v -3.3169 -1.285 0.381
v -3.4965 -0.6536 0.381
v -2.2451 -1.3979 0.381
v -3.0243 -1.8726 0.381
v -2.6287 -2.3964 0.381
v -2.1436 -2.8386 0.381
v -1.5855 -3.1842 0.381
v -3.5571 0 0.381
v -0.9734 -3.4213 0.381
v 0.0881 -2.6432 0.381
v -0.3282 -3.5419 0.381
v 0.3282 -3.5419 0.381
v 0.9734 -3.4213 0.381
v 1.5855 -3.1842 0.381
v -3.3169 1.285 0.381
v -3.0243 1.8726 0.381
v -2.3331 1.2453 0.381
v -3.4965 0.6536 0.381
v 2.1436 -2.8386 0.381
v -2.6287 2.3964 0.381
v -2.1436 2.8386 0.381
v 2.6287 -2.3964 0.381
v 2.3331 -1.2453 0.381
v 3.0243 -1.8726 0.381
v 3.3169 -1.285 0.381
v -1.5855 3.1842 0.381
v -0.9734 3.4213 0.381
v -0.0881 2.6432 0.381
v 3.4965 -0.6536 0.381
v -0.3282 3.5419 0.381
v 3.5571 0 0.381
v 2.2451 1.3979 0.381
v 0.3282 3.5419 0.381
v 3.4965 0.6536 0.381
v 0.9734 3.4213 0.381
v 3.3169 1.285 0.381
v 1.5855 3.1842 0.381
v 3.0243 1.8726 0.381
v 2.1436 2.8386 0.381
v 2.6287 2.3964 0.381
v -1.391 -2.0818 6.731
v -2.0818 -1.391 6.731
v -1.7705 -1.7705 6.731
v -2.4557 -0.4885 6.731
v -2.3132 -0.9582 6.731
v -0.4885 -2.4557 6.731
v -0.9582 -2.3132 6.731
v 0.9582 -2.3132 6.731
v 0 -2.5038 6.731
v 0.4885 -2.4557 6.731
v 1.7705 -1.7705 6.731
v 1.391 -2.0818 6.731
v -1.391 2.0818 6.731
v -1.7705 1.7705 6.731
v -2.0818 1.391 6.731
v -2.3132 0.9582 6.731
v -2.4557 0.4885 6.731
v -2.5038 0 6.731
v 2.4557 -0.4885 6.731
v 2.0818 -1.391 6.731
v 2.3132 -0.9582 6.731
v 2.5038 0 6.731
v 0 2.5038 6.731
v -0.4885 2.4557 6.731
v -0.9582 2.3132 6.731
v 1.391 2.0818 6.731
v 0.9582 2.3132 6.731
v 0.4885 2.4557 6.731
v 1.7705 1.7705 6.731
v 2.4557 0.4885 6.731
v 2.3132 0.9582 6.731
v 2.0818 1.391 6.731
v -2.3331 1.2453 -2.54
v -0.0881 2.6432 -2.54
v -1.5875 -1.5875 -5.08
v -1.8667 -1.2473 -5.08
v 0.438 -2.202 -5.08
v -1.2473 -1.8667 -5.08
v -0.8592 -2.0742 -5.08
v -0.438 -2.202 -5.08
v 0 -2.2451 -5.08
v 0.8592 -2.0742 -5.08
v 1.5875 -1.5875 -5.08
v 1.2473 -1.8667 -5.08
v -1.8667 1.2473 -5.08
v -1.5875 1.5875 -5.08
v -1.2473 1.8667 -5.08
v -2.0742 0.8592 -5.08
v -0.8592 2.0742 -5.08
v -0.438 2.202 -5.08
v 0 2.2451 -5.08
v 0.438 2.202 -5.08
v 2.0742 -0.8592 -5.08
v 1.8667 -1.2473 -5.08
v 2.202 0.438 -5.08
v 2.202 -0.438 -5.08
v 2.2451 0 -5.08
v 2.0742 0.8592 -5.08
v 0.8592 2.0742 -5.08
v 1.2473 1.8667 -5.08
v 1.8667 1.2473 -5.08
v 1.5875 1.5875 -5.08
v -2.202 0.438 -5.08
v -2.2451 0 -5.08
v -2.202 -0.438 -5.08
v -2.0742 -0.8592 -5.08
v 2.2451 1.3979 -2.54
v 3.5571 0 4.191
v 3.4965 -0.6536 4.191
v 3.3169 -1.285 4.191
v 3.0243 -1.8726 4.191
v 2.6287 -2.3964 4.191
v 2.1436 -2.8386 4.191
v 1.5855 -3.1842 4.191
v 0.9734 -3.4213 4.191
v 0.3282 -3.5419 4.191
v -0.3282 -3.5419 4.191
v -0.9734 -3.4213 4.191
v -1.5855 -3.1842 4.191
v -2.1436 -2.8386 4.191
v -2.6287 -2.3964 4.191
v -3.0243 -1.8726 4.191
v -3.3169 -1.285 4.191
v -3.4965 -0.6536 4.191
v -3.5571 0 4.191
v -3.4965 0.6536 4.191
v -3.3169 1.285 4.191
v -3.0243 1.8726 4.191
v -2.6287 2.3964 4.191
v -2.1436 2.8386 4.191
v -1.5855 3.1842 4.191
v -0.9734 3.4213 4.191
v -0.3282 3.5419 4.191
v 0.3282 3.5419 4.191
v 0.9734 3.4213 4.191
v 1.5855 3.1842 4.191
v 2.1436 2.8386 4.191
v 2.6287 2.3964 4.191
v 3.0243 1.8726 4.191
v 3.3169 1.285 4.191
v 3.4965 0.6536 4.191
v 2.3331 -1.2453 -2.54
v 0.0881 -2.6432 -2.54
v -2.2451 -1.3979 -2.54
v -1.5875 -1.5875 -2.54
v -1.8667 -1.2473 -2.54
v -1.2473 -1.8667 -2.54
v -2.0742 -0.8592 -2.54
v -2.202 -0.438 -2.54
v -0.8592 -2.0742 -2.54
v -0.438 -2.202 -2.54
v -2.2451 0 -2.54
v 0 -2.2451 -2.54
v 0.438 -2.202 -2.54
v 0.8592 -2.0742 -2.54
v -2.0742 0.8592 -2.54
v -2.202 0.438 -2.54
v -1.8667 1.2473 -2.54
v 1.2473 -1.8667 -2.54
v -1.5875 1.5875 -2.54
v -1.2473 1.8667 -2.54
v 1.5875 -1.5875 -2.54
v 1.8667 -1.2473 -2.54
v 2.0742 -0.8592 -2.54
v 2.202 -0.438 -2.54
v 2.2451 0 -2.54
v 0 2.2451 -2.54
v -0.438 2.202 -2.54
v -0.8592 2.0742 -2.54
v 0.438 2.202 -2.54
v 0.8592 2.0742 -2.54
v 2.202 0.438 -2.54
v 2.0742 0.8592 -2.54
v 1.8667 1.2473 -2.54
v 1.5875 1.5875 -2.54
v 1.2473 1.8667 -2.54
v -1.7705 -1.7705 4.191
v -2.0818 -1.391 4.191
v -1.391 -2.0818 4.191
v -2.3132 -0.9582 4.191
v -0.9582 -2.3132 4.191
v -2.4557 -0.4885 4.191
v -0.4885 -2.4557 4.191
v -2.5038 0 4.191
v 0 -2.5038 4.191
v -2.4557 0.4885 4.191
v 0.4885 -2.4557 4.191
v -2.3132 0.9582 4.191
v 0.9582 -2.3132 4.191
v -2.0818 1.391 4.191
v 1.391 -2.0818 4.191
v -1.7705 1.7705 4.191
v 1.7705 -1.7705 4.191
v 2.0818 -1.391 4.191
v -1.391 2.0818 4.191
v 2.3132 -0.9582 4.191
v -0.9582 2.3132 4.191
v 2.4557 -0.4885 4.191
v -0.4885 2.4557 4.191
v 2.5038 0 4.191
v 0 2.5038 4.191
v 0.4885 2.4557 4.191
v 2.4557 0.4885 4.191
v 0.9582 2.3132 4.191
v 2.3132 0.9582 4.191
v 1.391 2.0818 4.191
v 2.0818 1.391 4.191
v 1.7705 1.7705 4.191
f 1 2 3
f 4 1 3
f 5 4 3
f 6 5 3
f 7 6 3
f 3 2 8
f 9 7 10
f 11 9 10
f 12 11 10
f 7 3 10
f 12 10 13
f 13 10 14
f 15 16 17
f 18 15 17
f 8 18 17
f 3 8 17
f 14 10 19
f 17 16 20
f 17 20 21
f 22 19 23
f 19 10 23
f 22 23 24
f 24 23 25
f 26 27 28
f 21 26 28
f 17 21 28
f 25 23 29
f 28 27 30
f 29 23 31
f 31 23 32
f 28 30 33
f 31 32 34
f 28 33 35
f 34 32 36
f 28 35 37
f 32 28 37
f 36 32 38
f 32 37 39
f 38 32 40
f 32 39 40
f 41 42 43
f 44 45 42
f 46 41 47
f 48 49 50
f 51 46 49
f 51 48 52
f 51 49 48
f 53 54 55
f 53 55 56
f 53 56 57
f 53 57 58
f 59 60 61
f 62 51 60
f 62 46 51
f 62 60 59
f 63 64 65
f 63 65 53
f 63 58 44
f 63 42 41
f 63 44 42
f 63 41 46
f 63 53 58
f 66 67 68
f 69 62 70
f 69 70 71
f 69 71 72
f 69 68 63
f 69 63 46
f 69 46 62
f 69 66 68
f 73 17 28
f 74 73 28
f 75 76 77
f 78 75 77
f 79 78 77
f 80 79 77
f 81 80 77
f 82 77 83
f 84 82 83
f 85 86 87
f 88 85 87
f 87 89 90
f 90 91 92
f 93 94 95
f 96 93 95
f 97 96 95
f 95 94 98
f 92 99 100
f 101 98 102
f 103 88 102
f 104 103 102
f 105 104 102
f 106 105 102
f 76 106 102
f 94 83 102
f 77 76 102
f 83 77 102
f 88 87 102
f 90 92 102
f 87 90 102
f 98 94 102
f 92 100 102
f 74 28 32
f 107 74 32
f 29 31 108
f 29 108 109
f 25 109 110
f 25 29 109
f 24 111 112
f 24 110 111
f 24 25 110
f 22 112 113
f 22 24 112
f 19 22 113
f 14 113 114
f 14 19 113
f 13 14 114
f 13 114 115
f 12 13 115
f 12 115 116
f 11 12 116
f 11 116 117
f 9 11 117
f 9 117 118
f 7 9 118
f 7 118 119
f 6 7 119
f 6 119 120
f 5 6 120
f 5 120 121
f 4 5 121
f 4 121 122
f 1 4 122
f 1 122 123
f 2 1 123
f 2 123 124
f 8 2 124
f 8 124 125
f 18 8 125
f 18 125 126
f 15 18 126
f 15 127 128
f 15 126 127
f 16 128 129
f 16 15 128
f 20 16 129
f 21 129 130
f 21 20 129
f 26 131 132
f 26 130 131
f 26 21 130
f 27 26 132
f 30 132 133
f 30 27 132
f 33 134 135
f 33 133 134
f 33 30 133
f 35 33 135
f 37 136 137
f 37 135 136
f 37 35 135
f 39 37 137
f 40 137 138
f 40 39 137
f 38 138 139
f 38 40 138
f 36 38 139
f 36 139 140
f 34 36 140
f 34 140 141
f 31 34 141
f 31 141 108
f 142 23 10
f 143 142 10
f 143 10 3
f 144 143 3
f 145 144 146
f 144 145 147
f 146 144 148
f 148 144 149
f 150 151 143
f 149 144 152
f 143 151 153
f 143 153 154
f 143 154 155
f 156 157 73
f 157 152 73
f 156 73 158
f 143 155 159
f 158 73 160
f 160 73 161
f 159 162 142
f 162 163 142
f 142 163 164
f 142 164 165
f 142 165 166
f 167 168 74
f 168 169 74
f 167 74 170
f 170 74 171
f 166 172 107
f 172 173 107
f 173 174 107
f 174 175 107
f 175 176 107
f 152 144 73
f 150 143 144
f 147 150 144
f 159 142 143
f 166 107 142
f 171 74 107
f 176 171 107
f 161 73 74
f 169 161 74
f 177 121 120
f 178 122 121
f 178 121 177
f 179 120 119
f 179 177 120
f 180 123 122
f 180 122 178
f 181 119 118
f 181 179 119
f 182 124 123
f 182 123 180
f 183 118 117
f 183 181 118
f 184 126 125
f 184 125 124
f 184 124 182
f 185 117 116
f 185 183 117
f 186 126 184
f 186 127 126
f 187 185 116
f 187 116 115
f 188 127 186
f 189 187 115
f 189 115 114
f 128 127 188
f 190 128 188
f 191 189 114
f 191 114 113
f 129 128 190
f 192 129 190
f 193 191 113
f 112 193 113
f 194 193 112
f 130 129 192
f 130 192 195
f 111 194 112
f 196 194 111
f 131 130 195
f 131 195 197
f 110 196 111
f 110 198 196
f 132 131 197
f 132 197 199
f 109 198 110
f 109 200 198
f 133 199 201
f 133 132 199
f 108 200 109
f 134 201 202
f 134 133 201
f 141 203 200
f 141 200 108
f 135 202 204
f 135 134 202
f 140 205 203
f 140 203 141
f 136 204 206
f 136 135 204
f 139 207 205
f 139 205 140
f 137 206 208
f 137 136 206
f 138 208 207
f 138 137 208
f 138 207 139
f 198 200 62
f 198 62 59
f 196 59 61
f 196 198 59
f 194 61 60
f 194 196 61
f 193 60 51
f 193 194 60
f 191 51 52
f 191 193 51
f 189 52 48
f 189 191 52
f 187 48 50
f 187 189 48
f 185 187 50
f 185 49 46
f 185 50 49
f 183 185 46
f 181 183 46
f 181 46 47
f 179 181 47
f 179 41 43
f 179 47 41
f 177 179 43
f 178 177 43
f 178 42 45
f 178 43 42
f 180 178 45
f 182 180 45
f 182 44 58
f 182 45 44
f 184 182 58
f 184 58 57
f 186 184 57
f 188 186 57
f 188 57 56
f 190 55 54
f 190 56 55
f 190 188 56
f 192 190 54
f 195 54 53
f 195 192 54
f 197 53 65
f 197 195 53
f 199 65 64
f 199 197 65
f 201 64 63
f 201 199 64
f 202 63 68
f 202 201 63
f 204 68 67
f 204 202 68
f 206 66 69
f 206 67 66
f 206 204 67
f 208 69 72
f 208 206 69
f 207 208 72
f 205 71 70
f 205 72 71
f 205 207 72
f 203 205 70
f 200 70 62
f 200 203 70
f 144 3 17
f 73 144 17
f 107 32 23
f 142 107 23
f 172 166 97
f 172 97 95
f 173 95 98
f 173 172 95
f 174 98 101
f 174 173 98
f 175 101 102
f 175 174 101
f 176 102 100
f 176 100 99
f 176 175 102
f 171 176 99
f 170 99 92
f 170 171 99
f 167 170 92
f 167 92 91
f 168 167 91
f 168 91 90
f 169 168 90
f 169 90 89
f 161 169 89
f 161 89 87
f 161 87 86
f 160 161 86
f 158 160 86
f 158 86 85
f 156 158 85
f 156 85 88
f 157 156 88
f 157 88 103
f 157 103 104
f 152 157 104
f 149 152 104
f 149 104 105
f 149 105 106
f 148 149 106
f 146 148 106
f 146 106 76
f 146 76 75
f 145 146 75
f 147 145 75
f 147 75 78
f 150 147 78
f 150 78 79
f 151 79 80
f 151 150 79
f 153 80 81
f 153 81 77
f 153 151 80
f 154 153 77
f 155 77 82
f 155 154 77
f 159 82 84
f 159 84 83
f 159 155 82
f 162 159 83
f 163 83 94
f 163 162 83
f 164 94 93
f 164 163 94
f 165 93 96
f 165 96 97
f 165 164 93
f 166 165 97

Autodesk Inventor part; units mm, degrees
ref_plane "YZ Plane" through (0, 0, 0) normal (1, 0, 0) x (0, 1, 0)
ref_plane "XZ Plane" through (0, 0, 0) normal (0, 1, 0) x (-1, 0, 0)
ref_plane "XY Plane" through (0, 0, 0) normal (0, 0, 1) x (1, 0, 0)
sketch "Sketch1" plane through (0, 0, 0) normal (0, 0, 1) x (1, 0, 0)
  circle A0 centre (0, 0) radius 2.2451
extrude "Extrusion1" add sketch "Sketch1" against normal blind 5.08
sketch "Sketch2" plane through (0, 0, 0) normal (0, 0, 1) x (1, 0, 0)
  circle A0 centre (0, 0) radius 2.2451 projected
  line L0 (2.2451, 1.3979) -> (2.3331, -1.2453)
  line L1 (2.3331, -1.2453) -> (0.0881, -2.6432)
  line L2 (0.0881, -2.6432) -> (-2.2451, -1.3979)
  line L3 (-2.2451, -1.3979) -> (-2.3331, 1.2453)
  line L4 (-2.3331, 1.2453) -> (-0.0881, 2.6432)
  line L5 (-0.0881, 2.6432) -> (2.2451, 1.3979)
extrude "Extrusion2" add sketch "Sketch2" along normal blind 0.381 and the other way blind 2.54 contours A0 | L0 L1 L2 L3 L4 L5
sketch "Sketch3" plane through (0, 0, 0.381) normal (0, 0, 1) x (1, 0, 0)
  circle A0 centre (0, 0) radius 3.5571
extrude "Extrusion3" add sketch "Sketch3" along normal blind 3.81
sketch "Sketch4" plane through (0, 0, 4.191) normal (0, 0, 1) x (1, 0, 0)
  circle A0 centre (0, 0) radius 2.5038
extrude "Extrusion4" add sketch "Sketch4" along normal blind 2.54
properties part number "SC DC MOTOR"
